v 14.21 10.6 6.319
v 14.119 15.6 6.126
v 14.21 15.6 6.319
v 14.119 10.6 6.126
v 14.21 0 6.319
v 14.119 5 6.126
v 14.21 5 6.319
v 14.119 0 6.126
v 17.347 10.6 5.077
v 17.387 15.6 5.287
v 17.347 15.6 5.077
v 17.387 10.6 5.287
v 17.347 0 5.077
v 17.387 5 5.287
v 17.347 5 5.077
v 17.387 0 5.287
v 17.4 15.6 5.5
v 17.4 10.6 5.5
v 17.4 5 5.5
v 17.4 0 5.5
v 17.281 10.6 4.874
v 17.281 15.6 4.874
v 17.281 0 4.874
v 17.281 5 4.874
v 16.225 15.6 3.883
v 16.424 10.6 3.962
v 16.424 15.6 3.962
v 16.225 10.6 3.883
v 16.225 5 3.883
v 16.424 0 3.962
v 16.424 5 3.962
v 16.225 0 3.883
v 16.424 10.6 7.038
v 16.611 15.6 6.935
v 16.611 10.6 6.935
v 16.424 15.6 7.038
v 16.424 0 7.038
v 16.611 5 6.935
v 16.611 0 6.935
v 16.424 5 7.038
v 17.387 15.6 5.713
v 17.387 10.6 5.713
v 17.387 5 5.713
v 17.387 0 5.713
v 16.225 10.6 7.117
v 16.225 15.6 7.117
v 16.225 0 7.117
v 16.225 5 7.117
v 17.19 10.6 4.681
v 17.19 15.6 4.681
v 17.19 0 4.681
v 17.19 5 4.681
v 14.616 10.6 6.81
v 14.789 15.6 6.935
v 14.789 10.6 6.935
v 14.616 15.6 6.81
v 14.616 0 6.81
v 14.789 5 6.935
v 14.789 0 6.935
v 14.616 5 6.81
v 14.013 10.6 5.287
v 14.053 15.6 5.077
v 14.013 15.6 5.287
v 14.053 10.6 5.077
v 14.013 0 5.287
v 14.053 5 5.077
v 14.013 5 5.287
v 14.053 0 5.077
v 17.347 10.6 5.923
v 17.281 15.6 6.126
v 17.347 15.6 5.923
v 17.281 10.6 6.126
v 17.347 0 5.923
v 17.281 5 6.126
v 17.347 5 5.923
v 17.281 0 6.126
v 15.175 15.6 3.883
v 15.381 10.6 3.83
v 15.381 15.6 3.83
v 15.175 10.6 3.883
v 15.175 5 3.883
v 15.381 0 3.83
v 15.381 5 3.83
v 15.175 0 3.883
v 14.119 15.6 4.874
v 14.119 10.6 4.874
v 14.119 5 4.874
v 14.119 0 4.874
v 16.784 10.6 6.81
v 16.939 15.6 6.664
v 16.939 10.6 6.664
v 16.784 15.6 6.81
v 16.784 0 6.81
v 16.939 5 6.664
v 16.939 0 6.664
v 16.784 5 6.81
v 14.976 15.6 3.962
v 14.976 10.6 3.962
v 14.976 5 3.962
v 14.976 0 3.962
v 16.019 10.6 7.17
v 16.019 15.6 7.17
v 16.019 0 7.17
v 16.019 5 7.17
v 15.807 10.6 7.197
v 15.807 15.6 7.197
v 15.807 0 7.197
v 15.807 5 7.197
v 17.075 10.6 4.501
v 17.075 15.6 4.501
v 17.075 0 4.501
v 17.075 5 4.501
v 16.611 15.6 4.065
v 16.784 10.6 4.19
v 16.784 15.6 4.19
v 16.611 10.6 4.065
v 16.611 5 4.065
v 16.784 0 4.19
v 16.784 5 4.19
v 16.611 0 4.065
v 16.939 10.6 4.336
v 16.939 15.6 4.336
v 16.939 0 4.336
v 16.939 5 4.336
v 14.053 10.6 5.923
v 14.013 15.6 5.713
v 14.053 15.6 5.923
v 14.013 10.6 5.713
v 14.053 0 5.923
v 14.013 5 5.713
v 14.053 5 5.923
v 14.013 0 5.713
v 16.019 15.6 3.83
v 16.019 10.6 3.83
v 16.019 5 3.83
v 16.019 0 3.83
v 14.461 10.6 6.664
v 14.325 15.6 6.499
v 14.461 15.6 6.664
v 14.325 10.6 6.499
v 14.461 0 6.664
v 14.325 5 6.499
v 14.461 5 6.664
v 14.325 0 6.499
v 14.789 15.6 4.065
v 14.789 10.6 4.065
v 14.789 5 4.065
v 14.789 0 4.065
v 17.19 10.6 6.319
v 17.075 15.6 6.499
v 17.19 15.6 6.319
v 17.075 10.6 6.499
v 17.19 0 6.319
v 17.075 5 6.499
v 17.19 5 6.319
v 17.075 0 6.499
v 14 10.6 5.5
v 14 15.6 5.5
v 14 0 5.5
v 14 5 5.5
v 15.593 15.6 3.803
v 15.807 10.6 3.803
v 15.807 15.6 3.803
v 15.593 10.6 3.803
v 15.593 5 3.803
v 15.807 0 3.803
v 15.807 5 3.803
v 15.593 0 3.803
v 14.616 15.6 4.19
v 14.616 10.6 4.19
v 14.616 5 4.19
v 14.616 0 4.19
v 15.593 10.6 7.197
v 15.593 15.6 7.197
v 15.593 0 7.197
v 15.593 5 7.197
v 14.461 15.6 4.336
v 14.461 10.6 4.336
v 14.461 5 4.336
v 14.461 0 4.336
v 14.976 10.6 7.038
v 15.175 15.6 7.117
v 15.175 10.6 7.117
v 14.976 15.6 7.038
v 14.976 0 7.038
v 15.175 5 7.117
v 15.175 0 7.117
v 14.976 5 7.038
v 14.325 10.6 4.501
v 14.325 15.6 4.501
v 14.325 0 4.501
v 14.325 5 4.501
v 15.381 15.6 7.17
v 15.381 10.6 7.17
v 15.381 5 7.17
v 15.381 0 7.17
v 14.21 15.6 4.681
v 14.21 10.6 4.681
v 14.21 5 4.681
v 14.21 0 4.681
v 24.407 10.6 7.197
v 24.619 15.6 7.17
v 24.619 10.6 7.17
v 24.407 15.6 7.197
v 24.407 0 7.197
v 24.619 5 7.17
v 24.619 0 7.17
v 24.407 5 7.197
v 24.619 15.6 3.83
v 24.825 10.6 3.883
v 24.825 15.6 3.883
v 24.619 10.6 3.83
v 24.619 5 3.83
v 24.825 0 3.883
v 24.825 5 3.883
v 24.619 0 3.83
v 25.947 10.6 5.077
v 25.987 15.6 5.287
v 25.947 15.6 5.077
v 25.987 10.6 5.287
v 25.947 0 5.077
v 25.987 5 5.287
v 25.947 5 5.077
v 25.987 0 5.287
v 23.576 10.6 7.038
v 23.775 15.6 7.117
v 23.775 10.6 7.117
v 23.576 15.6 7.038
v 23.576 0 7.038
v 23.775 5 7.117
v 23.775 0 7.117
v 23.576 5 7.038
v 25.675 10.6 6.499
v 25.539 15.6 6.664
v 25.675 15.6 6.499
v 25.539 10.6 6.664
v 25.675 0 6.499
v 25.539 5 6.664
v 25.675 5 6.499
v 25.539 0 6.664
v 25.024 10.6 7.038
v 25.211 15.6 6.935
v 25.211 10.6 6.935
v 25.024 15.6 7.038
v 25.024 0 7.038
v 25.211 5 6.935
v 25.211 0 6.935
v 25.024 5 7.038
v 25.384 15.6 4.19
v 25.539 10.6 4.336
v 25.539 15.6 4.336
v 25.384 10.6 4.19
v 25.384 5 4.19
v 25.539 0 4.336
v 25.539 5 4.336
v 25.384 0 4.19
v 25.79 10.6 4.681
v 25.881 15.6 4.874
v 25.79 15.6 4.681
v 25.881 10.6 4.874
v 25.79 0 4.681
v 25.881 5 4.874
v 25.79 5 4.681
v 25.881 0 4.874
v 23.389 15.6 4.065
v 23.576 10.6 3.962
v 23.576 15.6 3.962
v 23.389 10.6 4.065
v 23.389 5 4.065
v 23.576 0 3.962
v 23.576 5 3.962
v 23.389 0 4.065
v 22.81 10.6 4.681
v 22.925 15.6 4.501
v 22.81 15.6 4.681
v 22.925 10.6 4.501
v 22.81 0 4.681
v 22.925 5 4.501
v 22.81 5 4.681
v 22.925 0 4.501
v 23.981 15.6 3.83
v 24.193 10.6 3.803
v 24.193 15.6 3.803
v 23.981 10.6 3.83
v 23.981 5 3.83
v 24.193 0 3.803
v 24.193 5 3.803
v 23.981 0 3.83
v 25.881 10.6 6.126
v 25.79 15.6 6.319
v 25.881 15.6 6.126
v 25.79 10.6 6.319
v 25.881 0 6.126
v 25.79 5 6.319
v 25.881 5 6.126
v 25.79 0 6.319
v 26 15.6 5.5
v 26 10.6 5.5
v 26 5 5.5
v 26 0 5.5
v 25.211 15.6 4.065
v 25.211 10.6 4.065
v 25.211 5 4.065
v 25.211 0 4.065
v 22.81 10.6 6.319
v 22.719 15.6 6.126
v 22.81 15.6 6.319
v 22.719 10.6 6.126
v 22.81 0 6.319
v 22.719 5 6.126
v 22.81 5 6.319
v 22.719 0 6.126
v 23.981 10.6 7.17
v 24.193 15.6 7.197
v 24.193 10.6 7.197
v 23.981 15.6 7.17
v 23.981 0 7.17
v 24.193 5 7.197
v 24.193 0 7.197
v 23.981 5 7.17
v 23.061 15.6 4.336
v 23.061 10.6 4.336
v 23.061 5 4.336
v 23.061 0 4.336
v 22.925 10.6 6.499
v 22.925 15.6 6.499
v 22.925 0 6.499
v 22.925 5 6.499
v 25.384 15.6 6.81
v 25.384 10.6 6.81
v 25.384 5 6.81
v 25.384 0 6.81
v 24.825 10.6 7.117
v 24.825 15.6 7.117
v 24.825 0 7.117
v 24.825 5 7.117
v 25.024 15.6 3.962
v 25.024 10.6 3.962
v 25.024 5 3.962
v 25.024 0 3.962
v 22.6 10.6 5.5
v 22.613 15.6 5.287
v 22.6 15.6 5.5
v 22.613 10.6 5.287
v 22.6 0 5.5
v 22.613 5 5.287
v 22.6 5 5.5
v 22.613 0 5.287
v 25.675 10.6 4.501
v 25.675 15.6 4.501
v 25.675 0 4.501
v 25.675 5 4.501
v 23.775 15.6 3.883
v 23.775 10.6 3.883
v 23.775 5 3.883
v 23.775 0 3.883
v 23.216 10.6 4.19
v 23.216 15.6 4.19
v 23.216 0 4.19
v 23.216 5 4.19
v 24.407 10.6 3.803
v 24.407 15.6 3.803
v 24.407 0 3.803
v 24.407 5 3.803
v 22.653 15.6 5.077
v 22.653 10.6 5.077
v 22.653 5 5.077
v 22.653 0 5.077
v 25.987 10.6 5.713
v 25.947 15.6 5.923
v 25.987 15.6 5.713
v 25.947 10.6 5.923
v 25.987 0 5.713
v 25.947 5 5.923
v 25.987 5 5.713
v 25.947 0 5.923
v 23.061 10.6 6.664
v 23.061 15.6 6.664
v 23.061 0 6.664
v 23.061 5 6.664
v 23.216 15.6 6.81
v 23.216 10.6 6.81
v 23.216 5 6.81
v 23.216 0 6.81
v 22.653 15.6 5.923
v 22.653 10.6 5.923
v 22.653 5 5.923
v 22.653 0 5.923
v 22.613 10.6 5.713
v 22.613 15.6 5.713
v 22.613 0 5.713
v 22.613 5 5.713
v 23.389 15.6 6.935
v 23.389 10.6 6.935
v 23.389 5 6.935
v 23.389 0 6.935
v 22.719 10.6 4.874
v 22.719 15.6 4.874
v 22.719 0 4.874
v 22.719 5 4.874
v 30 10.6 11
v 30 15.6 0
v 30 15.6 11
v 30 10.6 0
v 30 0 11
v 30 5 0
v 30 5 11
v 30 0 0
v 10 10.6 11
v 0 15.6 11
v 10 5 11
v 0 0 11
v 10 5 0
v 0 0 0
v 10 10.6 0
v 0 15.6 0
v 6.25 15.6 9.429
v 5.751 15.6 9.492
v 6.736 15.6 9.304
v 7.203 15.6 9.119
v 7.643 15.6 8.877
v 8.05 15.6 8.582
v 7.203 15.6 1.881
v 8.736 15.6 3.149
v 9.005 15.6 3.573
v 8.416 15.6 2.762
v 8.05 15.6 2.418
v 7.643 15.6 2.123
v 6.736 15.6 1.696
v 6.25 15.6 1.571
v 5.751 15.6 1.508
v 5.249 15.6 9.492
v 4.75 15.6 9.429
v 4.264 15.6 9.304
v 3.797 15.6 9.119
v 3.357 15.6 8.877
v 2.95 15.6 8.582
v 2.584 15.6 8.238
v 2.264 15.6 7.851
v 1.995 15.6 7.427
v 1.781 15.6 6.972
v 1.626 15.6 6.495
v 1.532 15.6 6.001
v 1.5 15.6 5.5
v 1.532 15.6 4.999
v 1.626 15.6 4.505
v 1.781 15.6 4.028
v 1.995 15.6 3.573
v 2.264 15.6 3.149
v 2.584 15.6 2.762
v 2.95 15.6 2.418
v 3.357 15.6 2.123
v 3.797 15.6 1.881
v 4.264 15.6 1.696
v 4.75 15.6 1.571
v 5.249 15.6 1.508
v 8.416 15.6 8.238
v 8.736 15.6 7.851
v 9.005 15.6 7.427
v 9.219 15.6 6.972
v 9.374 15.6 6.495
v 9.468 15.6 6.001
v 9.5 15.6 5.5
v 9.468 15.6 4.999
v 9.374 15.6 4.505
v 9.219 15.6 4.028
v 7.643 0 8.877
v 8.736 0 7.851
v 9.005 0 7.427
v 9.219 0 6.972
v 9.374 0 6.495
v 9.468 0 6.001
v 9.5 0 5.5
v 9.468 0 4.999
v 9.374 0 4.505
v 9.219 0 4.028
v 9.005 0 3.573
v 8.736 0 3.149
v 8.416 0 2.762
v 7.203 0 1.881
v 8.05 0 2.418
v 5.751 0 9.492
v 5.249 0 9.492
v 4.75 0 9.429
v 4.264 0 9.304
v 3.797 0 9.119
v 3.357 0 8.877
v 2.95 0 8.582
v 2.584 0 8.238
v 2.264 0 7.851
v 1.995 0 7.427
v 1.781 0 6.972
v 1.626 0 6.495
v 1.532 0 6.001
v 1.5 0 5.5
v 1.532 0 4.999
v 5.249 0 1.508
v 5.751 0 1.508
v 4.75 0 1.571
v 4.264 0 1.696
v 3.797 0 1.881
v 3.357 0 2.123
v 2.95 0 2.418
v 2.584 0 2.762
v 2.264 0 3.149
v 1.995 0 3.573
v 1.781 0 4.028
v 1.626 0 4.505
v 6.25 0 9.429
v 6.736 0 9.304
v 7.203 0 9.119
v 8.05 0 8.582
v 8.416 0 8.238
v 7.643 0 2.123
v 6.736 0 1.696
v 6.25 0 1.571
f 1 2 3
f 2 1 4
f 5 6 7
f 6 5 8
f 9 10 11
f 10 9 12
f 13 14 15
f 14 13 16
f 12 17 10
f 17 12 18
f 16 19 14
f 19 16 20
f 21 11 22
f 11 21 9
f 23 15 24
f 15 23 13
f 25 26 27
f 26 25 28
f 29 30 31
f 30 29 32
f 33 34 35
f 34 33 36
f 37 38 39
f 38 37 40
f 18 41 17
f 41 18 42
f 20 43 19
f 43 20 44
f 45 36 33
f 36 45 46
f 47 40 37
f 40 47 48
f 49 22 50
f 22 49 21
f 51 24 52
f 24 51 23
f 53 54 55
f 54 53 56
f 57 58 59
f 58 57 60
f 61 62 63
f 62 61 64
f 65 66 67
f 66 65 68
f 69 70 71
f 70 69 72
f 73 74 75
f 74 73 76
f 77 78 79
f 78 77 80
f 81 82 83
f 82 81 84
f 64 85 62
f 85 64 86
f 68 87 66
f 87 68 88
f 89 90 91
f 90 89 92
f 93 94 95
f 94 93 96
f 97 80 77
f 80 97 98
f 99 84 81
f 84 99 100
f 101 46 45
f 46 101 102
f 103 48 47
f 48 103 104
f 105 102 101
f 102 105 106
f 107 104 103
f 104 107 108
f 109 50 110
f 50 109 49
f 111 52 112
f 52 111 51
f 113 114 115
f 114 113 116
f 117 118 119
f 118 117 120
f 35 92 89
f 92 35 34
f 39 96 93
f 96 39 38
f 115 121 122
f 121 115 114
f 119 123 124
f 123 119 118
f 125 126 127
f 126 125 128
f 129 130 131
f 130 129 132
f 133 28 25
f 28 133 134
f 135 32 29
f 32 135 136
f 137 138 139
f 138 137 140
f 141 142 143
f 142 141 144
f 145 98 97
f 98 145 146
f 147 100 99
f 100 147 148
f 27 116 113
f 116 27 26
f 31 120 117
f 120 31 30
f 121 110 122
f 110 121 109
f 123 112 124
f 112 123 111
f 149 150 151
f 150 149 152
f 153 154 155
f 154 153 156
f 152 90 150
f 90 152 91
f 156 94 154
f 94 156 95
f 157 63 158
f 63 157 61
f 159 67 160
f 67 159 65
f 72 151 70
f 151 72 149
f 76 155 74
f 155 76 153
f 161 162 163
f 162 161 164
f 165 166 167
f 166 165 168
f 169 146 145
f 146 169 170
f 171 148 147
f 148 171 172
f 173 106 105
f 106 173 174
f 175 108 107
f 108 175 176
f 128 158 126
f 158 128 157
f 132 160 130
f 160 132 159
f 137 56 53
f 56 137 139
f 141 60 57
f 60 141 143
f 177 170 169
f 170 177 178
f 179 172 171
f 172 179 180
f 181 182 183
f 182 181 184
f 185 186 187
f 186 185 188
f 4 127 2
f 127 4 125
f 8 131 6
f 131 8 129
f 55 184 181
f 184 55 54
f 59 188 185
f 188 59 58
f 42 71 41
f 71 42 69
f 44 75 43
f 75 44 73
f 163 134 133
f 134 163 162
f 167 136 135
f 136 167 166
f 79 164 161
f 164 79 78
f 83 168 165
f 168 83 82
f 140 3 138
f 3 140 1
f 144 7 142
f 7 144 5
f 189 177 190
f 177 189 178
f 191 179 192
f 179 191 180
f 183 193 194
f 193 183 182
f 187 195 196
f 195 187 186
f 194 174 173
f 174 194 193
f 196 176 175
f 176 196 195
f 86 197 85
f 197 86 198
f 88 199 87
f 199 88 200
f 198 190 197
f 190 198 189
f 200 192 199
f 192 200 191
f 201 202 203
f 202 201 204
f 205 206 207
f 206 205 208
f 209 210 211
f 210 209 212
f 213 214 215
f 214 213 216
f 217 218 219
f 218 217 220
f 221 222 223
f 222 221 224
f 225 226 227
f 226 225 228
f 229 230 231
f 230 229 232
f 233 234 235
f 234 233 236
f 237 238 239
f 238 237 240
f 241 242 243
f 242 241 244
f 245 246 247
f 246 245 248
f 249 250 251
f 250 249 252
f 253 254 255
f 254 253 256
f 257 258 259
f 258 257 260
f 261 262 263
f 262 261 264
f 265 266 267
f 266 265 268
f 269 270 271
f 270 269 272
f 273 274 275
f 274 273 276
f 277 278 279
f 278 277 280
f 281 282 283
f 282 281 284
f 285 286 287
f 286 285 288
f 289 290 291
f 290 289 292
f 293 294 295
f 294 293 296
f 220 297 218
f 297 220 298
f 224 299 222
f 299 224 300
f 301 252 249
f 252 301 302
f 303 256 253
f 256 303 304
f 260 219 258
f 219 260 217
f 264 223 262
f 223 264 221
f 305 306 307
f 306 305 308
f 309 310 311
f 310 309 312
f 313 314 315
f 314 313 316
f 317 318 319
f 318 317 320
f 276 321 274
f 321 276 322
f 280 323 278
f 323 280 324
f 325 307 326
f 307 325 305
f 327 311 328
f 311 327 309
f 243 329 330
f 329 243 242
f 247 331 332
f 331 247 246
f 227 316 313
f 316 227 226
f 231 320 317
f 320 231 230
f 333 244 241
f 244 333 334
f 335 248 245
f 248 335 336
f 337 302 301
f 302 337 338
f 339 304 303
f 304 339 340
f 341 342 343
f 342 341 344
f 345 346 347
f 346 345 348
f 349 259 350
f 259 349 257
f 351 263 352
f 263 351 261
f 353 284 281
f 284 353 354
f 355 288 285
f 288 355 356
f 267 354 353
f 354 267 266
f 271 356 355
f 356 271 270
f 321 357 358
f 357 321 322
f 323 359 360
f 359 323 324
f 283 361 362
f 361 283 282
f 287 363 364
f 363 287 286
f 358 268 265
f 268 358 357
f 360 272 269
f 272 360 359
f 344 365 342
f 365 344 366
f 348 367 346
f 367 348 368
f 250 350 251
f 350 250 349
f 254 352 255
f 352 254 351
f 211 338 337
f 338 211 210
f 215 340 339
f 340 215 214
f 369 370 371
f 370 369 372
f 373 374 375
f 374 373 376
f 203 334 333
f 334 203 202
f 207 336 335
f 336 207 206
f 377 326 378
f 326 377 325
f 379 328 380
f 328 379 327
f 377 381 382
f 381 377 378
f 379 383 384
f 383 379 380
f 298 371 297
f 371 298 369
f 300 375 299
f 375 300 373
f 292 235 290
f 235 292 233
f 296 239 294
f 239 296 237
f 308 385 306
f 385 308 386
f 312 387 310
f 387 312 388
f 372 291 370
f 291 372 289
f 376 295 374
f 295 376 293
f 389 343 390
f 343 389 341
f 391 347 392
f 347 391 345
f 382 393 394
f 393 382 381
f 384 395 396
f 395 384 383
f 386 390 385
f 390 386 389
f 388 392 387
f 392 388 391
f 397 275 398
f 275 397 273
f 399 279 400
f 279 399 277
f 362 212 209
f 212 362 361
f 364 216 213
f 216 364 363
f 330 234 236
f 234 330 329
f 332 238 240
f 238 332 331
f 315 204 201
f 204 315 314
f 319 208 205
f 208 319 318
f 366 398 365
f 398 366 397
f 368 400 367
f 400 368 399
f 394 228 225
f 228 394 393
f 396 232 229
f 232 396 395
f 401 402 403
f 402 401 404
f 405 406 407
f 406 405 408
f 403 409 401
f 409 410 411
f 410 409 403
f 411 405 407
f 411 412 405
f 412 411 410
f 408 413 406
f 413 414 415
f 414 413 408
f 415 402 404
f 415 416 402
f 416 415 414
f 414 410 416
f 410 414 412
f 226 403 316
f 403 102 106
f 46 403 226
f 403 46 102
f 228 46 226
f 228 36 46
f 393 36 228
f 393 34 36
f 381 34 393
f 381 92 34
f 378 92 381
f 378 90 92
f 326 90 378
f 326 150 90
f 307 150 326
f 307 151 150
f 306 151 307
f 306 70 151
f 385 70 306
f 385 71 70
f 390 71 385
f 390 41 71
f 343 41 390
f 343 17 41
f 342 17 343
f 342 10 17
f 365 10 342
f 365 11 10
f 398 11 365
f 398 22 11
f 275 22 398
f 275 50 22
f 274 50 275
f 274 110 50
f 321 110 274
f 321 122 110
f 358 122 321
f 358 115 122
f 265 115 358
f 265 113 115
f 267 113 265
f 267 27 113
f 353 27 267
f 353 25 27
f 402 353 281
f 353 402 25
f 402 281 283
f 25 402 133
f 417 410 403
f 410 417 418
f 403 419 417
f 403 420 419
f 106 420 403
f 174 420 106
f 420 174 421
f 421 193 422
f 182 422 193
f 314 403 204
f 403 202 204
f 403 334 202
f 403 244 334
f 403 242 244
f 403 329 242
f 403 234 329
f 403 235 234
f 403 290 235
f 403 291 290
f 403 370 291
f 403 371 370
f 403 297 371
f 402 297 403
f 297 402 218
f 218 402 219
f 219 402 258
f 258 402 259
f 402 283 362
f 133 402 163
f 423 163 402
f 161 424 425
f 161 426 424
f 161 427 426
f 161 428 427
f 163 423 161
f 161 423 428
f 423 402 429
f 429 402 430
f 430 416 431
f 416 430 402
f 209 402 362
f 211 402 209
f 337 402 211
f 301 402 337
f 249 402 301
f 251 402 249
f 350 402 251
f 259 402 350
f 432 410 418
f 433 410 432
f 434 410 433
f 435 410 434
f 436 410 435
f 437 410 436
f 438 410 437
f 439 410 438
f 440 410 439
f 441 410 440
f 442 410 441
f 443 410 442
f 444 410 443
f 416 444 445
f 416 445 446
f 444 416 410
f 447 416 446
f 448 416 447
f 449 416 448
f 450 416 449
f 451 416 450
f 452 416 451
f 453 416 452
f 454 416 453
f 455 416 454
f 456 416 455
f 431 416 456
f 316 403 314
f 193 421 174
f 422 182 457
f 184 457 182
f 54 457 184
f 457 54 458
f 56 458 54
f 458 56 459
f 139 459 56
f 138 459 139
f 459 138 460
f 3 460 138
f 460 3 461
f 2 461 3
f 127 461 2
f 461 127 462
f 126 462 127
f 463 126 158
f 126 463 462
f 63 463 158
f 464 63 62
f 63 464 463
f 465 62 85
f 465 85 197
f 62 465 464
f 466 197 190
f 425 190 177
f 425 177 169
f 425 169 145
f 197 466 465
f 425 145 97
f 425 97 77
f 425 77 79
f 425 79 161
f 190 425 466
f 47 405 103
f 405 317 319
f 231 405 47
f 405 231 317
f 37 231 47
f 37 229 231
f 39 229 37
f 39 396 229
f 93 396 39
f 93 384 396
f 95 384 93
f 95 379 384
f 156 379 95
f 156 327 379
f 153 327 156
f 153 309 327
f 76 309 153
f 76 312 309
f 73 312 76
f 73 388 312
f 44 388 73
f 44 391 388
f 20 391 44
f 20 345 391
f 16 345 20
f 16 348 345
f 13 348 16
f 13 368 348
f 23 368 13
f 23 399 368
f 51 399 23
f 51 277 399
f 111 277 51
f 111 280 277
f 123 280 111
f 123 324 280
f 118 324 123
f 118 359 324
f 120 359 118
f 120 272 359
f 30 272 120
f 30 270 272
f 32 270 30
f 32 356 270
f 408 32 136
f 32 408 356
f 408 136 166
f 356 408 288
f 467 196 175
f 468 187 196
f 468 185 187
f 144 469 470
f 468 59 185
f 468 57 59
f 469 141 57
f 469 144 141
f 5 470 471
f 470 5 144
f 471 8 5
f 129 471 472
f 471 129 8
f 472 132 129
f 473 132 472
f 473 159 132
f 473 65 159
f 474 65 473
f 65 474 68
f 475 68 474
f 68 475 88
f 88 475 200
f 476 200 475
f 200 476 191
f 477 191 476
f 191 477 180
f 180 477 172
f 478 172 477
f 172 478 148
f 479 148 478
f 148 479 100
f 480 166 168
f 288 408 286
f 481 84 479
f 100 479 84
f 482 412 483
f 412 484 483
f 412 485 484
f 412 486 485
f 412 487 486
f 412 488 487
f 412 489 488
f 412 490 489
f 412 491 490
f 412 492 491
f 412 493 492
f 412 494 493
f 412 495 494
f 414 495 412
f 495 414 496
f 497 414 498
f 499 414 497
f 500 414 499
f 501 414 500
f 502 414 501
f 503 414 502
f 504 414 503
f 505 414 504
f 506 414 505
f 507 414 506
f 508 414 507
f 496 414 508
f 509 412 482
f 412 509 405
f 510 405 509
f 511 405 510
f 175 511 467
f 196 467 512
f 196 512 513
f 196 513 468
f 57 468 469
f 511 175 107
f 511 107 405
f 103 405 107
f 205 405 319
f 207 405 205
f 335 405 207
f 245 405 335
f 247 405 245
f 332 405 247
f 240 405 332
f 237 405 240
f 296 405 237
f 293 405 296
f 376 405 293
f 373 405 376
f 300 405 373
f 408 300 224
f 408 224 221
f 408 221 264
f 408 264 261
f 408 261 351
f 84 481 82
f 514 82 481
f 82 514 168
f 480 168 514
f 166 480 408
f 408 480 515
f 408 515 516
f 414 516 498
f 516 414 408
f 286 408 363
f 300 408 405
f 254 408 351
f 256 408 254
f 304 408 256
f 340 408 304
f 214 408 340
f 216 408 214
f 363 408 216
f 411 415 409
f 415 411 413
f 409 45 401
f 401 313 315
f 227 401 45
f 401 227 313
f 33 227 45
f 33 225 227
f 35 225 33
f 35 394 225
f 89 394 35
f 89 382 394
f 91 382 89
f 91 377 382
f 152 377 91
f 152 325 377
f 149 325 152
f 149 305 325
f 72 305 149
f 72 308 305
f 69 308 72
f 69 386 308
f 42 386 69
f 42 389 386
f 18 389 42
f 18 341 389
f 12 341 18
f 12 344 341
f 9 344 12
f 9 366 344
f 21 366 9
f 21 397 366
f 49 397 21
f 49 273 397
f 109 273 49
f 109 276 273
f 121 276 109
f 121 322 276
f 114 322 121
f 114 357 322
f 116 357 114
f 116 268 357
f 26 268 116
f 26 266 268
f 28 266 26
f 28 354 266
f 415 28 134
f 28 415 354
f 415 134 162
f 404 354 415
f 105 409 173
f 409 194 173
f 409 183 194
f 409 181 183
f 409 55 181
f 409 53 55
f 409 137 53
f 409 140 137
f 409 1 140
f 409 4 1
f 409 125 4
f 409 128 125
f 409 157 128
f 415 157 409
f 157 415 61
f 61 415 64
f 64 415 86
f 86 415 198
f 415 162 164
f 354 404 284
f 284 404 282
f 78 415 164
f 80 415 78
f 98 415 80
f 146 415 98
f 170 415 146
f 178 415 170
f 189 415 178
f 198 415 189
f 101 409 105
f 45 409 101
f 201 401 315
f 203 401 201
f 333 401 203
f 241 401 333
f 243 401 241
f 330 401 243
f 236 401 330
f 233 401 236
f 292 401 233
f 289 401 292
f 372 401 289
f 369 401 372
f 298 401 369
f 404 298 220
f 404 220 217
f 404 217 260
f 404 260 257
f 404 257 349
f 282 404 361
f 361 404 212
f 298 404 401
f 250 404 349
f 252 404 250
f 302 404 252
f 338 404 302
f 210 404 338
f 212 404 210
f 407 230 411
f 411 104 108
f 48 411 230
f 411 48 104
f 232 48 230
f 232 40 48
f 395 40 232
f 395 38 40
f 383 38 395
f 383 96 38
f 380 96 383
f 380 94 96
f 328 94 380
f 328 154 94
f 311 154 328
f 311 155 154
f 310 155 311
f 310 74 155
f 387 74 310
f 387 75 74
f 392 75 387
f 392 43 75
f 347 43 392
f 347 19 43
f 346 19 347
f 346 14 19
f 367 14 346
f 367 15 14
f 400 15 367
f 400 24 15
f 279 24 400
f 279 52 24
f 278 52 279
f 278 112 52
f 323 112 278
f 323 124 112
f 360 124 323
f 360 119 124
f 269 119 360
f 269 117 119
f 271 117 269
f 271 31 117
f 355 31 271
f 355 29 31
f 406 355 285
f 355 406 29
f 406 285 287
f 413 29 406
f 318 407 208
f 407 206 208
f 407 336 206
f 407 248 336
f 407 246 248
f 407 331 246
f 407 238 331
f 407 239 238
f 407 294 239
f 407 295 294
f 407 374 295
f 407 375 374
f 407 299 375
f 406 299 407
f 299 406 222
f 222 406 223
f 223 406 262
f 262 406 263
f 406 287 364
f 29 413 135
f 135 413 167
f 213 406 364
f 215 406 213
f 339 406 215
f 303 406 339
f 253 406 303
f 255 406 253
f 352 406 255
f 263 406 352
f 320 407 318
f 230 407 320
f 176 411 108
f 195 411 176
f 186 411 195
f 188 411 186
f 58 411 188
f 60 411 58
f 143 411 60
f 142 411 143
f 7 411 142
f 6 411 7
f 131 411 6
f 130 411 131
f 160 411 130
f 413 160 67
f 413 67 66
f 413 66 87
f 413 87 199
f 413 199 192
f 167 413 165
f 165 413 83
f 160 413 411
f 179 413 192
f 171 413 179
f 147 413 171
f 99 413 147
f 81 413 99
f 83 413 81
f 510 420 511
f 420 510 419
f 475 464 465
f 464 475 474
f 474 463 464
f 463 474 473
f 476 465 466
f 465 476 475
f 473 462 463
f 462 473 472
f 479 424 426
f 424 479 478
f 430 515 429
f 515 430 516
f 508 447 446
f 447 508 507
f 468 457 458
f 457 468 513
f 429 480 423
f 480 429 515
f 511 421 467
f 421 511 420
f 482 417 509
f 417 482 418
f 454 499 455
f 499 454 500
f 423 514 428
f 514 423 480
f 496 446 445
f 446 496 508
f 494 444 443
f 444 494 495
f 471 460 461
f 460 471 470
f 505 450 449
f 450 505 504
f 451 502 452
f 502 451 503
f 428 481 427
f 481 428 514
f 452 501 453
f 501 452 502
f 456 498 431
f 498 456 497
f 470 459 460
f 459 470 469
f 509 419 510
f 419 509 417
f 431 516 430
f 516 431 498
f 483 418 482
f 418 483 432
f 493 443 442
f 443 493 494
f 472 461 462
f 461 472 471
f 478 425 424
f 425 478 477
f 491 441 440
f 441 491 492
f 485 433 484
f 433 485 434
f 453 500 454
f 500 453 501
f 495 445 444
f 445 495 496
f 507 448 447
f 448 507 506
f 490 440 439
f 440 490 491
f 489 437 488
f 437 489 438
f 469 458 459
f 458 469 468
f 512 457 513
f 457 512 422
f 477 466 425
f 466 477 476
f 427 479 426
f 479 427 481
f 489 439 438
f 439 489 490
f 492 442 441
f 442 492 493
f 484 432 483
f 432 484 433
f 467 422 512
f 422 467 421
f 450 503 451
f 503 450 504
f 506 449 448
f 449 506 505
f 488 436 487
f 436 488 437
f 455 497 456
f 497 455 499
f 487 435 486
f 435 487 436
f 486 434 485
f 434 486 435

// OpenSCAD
// durchmesser gewindestange. Absichtlich Knapp bemessen.
bohrung = 8;				// [2:0.1:16]

// Länge der gabelzinken
gabel = 20;				// [8:64]

// Stärke der Schenkel, die die Gabel formen.
wand = 5;				// [1:24]

// Materialstärke Rahmen, worauf Gabel geschoben wird
rahmen = 5.6;				// [2:0.1:16]

// Abmessung in Y-Richtung wenn montiert 
breite = 11;				// [4:32]

// Bohrung über Gabel
boden = 0.5;				// [0:0.1:20]

// diameter of holes for screws. Set to 0 for no holes
schraube = 3.4;				// [0:0.1:8]

// soweit werden Löcher für Schrauben eingerückt.
schraube_zum_rand = 4;			// [0:10]



schraube_radius = schraube/2;
bohrung_radius = bohrung/2;
dach = (breite-bohrung)/2;		
tiefe = wand+rahmen+wand;		// X-Richtung wenn montiert
hoehe = gabel+boden+bohrung+dach;	// Z-Richtung wenn montiert
// zur Verbesserung vom OpenSCAD Preview
little=0.01;				
$fn = 50;

module Wellenbock()  {
	difference()  {
		cube([hoehe, tiefe, breite]);					// Basis Block

		translate([dach+bohrung+boden, wand, -little/2])
		cube([gabel+little/2, rahmen, breite+little]);			// Gabel

		translate([dach+bohrung/2, -little/2, breite/2])
		rotate([-90, 0, 0])
		cylinder(tiefe+little, bohrung_radius, bohrung_radius);		// Bohrung für Welle

		if(schraube) {							// Bohrungen für Befestigungsschrauben
			for (x=[dach+bohrung+boden+schraube_radius+schraube_zum_rand,
			        hoehe-schraube_radius-schraube_zum_rand])  {  
				translate([x, -little/2, breite/2])
				rotate([-90, 0, 0])
				cylinder(tiefe+little, schraube_radius, schraube_radius);
			}
		}
	}
}			

Wellenbock();
